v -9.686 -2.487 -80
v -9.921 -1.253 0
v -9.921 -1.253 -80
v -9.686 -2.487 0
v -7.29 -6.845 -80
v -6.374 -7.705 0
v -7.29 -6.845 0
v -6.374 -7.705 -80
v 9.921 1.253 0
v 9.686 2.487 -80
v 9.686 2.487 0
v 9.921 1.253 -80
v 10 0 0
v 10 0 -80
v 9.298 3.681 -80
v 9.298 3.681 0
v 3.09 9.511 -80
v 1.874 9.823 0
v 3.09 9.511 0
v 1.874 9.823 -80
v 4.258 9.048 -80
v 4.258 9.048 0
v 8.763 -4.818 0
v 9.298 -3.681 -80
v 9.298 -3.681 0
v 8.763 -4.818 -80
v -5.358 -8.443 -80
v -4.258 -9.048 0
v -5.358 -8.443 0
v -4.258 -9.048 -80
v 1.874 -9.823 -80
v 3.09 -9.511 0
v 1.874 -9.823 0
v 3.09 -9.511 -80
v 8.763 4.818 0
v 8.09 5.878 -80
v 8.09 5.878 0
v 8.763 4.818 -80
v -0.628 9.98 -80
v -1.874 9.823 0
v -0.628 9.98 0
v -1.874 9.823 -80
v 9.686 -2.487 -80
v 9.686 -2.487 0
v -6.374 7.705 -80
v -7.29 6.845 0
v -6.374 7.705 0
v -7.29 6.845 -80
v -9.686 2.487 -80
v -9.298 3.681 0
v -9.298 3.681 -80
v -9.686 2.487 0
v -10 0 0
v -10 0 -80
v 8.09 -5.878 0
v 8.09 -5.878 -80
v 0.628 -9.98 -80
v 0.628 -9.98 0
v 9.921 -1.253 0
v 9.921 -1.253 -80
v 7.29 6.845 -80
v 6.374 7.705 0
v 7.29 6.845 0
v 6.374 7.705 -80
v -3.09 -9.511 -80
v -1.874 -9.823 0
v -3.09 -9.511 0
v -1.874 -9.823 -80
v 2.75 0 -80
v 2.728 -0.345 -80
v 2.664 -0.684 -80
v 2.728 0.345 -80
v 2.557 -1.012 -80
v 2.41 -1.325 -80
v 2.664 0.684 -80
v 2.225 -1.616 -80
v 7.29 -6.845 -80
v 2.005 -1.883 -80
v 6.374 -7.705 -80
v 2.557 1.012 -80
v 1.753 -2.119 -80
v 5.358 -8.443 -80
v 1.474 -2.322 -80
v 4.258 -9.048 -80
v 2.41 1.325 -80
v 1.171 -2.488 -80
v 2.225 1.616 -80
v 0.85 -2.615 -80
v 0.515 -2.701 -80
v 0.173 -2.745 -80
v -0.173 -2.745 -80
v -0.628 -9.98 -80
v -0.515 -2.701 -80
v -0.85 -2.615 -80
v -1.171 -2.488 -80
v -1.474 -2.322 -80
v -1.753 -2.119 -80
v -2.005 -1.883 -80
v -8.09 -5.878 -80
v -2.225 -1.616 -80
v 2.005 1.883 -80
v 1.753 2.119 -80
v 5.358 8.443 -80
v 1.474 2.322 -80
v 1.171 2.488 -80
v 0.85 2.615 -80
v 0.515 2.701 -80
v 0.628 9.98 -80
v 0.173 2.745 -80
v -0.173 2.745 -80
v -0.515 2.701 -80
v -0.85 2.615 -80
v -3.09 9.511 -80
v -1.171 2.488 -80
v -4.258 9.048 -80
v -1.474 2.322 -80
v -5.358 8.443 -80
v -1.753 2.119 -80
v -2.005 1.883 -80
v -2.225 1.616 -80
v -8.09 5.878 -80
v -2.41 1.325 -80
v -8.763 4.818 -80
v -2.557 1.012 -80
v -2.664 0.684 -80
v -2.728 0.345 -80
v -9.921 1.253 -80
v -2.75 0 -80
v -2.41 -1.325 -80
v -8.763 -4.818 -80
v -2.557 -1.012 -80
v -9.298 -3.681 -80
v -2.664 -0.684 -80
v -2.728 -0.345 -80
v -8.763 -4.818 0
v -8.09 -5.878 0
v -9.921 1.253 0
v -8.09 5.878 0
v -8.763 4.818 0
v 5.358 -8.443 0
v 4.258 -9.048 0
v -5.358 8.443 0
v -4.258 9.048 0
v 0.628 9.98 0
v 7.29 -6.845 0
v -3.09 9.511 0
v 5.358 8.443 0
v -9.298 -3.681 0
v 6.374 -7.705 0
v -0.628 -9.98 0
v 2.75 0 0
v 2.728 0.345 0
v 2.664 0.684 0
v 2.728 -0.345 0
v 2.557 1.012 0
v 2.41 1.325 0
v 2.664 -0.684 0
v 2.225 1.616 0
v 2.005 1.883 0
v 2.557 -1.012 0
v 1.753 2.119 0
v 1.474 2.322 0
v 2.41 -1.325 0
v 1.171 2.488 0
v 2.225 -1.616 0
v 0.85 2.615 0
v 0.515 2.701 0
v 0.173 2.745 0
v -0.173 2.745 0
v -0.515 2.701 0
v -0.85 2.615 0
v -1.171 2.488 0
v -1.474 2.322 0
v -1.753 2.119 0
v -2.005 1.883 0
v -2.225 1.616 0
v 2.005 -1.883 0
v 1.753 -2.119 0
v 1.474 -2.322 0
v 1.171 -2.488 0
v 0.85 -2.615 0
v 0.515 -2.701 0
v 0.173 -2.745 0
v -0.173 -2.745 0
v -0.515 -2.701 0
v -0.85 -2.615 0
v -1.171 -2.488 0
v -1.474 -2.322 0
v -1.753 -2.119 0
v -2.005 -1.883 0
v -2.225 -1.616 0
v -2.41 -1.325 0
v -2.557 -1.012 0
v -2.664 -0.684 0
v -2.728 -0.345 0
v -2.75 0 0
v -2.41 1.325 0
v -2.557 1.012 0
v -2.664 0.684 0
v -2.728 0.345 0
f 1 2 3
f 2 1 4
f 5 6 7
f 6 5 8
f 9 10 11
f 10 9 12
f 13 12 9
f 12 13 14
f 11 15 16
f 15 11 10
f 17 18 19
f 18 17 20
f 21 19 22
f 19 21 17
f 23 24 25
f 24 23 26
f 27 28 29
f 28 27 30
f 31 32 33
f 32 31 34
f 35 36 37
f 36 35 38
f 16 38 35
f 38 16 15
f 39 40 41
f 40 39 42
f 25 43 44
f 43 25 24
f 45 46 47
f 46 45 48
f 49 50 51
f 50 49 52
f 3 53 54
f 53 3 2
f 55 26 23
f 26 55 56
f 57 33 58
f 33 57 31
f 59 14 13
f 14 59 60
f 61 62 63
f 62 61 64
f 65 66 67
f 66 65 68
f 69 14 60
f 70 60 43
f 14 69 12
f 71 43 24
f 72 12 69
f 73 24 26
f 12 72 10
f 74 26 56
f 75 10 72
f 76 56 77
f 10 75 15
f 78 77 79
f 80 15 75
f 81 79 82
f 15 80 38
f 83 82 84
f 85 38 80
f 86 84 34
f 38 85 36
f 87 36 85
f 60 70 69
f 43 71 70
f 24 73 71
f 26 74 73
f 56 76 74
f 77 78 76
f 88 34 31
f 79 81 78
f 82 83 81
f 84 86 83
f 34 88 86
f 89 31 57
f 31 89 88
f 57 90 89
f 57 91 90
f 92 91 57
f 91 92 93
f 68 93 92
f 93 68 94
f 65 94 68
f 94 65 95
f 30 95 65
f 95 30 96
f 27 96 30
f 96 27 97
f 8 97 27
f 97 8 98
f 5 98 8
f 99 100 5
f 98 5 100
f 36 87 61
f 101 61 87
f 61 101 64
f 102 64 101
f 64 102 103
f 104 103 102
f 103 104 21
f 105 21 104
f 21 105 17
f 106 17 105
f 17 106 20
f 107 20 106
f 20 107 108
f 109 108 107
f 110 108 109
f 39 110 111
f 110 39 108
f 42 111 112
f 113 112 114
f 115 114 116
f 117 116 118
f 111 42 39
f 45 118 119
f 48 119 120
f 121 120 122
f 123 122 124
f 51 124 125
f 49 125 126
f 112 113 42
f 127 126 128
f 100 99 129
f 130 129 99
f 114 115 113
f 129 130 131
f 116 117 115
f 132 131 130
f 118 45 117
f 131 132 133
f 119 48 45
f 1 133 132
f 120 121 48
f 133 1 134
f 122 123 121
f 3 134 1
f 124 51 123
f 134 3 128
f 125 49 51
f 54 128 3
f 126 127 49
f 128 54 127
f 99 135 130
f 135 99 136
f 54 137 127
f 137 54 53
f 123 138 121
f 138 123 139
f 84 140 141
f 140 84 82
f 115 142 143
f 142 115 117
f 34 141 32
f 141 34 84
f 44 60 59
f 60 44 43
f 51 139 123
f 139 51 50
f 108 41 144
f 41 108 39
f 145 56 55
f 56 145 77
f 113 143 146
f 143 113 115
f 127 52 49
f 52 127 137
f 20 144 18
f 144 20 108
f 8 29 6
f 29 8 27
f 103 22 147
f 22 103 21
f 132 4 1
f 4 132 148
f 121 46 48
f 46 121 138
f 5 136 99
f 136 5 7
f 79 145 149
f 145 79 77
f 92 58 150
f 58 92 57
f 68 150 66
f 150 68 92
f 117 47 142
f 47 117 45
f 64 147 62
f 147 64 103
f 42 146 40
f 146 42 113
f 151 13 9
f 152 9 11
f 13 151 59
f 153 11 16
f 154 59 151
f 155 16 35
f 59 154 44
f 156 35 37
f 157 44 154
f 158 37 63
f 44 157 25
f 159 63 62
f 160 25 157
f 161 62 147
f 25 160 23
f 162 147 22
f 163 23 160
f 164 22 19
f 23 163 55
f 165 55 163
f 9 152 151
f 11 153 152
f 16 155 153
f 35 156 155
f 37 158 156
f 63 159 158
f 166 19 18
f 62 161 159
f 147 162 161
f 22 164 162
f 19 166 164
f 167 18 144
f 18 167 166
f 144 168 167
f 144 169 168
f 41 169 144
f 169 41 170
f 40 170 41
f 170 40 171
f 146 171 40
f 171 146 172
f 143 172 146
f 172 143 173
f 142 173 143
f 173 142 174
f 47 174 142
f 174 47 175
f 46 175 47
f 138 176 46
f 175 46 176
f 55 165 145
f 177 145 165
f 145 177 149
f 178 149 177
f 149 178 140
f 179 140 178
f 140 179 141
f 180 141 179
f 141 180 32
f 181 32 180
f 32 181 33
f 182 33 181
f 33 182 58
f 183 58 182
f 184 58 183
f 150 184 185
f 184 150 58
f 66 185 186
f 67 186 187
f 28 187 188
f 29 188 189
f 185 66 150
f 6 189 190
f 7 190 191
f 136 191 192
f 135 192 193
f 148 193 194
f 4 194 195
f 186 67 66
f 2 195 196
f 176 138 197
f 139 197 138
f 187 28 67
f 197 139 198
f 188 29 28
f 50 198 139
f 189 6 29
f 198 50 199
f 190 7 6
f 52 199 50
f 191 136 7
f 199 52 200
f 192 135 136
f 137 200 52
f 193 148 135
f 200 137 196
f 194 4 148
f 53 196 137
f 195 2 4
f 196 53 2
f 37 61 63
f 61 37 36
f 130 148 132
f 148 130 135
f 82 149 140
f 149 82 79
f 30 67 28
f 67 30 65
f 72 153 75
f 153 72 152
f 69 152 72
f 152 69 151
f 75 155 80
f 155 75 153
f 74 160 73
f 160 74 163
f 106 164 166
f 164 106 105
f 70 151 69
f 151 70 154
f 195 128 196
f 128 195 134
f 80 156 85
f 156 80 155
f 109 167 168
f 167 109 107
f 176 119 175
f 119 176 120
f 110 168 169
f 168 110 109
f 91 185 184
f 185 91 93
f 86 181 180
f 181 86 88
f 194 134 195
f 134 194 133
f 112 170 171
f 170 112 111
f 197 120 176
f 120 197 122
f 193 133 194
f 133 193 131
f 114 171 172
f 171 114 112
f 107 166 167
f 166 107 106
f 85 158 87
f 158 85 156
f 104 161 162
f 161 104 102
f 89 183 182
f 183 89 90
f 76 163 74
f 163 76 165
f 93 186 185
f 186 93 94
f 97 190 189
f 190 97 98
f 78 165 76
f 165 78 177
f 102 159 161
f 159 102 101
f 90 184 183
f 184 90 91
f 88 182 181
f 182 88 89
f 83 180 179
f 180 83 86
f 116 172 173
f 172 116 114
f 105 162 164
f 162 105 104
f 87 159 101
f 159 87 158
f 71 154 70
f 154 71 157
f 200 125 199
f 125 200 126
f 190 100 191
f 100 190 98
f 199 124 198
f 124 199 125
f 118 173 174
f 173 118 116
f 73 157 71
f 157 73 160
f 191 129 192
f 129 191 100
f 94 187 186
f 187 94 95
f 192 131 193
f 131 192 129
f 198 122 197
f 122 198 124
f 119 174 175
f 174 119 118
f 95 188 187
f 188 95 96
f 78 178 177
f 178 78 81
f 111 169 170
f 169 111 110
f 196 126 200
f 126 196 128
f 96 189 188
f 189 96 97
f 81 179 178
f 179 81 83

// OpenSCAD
$fn = 50;


difference() {
	union() {
		translate(v = [0, 0, -80.0000000000]) {
			cylinder(h = 80, r = 10.0000000000);
		}
		cylinder(h = 0, r = 19.0000000000);
	}
	union() {
		#translate(v = [0, 0, -80]) {
			cylinder(h = 80, r = 2.7500000000);
		}
	}
}
